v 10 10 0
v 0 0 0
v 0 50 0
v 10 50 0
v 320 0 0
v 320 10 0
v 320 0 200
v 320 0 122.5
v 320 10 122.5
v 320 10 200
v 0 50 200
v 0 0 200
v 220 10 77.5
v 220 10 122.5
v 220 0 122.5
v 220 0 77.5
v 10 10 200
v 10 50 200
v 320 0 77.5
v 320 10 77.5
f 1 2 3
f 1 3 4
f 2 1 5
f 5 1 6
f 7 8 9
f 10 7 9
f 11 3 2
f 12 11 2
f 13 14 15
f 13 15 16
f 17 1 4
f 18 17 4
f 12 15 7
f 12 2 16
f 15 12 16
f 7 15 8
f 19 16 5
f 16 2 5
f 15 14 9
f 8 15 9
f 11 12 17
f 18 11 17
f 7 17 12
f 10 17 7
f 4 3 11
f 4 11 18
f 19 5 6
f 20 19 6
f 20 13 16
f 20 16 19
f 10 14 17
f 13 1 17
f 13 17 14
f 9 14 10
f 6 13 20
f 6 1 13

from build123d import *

# Parameters (mm, degrees)
ESQUISSE1_W             = 310
ESQUISSE1_H             = 10
ESQUISSE1_W_2           = 10
ESQUISSE1_H_2           = 40
BOSS_EXTRU_1_DEPTH      = 200
ESQUISSE4_W             = 100
ESQUISSE4_H             = 45
ENL_V_MAT_EXTRU_1_DEPTH = 10


with BuildPart() as part:
    # Esquisse1 → Boss.-Extru.1 (new body)
    with BuildSketch(Plane.XY):
        with Locations((165, 5)):
            Rectangle(ESQUISSE1_W, ESQUISSE1_H)
        with Locations((5, 30)):
            Rectangle(ESQUISSE1_W_2, ESQUISSE1_H_2)
        with Locations((5, 5)):
            Rectangle(ESQUISSE1_W_2, ESQUISSE1_H)
    extrude(amount=BOSS_EXTRU_1_DEPTH)

    # Esquisse4 → Enlèv. mat.-Extru.1 (cut)
    with BuildSketch(Plane(origin=(0, 10, 0), x_dir=(1, 0, 0), z_dir=(0, 1, 0))):
        with Locations((270, -100)):
            Rectangle(ESQUISSE4_W, ESQUISSE4_H)
    extrude(amount=-ENL_V_MAT_EXTRU_1_DEPTH, mode=Mode.SUBTRACT)


solid = part.part
